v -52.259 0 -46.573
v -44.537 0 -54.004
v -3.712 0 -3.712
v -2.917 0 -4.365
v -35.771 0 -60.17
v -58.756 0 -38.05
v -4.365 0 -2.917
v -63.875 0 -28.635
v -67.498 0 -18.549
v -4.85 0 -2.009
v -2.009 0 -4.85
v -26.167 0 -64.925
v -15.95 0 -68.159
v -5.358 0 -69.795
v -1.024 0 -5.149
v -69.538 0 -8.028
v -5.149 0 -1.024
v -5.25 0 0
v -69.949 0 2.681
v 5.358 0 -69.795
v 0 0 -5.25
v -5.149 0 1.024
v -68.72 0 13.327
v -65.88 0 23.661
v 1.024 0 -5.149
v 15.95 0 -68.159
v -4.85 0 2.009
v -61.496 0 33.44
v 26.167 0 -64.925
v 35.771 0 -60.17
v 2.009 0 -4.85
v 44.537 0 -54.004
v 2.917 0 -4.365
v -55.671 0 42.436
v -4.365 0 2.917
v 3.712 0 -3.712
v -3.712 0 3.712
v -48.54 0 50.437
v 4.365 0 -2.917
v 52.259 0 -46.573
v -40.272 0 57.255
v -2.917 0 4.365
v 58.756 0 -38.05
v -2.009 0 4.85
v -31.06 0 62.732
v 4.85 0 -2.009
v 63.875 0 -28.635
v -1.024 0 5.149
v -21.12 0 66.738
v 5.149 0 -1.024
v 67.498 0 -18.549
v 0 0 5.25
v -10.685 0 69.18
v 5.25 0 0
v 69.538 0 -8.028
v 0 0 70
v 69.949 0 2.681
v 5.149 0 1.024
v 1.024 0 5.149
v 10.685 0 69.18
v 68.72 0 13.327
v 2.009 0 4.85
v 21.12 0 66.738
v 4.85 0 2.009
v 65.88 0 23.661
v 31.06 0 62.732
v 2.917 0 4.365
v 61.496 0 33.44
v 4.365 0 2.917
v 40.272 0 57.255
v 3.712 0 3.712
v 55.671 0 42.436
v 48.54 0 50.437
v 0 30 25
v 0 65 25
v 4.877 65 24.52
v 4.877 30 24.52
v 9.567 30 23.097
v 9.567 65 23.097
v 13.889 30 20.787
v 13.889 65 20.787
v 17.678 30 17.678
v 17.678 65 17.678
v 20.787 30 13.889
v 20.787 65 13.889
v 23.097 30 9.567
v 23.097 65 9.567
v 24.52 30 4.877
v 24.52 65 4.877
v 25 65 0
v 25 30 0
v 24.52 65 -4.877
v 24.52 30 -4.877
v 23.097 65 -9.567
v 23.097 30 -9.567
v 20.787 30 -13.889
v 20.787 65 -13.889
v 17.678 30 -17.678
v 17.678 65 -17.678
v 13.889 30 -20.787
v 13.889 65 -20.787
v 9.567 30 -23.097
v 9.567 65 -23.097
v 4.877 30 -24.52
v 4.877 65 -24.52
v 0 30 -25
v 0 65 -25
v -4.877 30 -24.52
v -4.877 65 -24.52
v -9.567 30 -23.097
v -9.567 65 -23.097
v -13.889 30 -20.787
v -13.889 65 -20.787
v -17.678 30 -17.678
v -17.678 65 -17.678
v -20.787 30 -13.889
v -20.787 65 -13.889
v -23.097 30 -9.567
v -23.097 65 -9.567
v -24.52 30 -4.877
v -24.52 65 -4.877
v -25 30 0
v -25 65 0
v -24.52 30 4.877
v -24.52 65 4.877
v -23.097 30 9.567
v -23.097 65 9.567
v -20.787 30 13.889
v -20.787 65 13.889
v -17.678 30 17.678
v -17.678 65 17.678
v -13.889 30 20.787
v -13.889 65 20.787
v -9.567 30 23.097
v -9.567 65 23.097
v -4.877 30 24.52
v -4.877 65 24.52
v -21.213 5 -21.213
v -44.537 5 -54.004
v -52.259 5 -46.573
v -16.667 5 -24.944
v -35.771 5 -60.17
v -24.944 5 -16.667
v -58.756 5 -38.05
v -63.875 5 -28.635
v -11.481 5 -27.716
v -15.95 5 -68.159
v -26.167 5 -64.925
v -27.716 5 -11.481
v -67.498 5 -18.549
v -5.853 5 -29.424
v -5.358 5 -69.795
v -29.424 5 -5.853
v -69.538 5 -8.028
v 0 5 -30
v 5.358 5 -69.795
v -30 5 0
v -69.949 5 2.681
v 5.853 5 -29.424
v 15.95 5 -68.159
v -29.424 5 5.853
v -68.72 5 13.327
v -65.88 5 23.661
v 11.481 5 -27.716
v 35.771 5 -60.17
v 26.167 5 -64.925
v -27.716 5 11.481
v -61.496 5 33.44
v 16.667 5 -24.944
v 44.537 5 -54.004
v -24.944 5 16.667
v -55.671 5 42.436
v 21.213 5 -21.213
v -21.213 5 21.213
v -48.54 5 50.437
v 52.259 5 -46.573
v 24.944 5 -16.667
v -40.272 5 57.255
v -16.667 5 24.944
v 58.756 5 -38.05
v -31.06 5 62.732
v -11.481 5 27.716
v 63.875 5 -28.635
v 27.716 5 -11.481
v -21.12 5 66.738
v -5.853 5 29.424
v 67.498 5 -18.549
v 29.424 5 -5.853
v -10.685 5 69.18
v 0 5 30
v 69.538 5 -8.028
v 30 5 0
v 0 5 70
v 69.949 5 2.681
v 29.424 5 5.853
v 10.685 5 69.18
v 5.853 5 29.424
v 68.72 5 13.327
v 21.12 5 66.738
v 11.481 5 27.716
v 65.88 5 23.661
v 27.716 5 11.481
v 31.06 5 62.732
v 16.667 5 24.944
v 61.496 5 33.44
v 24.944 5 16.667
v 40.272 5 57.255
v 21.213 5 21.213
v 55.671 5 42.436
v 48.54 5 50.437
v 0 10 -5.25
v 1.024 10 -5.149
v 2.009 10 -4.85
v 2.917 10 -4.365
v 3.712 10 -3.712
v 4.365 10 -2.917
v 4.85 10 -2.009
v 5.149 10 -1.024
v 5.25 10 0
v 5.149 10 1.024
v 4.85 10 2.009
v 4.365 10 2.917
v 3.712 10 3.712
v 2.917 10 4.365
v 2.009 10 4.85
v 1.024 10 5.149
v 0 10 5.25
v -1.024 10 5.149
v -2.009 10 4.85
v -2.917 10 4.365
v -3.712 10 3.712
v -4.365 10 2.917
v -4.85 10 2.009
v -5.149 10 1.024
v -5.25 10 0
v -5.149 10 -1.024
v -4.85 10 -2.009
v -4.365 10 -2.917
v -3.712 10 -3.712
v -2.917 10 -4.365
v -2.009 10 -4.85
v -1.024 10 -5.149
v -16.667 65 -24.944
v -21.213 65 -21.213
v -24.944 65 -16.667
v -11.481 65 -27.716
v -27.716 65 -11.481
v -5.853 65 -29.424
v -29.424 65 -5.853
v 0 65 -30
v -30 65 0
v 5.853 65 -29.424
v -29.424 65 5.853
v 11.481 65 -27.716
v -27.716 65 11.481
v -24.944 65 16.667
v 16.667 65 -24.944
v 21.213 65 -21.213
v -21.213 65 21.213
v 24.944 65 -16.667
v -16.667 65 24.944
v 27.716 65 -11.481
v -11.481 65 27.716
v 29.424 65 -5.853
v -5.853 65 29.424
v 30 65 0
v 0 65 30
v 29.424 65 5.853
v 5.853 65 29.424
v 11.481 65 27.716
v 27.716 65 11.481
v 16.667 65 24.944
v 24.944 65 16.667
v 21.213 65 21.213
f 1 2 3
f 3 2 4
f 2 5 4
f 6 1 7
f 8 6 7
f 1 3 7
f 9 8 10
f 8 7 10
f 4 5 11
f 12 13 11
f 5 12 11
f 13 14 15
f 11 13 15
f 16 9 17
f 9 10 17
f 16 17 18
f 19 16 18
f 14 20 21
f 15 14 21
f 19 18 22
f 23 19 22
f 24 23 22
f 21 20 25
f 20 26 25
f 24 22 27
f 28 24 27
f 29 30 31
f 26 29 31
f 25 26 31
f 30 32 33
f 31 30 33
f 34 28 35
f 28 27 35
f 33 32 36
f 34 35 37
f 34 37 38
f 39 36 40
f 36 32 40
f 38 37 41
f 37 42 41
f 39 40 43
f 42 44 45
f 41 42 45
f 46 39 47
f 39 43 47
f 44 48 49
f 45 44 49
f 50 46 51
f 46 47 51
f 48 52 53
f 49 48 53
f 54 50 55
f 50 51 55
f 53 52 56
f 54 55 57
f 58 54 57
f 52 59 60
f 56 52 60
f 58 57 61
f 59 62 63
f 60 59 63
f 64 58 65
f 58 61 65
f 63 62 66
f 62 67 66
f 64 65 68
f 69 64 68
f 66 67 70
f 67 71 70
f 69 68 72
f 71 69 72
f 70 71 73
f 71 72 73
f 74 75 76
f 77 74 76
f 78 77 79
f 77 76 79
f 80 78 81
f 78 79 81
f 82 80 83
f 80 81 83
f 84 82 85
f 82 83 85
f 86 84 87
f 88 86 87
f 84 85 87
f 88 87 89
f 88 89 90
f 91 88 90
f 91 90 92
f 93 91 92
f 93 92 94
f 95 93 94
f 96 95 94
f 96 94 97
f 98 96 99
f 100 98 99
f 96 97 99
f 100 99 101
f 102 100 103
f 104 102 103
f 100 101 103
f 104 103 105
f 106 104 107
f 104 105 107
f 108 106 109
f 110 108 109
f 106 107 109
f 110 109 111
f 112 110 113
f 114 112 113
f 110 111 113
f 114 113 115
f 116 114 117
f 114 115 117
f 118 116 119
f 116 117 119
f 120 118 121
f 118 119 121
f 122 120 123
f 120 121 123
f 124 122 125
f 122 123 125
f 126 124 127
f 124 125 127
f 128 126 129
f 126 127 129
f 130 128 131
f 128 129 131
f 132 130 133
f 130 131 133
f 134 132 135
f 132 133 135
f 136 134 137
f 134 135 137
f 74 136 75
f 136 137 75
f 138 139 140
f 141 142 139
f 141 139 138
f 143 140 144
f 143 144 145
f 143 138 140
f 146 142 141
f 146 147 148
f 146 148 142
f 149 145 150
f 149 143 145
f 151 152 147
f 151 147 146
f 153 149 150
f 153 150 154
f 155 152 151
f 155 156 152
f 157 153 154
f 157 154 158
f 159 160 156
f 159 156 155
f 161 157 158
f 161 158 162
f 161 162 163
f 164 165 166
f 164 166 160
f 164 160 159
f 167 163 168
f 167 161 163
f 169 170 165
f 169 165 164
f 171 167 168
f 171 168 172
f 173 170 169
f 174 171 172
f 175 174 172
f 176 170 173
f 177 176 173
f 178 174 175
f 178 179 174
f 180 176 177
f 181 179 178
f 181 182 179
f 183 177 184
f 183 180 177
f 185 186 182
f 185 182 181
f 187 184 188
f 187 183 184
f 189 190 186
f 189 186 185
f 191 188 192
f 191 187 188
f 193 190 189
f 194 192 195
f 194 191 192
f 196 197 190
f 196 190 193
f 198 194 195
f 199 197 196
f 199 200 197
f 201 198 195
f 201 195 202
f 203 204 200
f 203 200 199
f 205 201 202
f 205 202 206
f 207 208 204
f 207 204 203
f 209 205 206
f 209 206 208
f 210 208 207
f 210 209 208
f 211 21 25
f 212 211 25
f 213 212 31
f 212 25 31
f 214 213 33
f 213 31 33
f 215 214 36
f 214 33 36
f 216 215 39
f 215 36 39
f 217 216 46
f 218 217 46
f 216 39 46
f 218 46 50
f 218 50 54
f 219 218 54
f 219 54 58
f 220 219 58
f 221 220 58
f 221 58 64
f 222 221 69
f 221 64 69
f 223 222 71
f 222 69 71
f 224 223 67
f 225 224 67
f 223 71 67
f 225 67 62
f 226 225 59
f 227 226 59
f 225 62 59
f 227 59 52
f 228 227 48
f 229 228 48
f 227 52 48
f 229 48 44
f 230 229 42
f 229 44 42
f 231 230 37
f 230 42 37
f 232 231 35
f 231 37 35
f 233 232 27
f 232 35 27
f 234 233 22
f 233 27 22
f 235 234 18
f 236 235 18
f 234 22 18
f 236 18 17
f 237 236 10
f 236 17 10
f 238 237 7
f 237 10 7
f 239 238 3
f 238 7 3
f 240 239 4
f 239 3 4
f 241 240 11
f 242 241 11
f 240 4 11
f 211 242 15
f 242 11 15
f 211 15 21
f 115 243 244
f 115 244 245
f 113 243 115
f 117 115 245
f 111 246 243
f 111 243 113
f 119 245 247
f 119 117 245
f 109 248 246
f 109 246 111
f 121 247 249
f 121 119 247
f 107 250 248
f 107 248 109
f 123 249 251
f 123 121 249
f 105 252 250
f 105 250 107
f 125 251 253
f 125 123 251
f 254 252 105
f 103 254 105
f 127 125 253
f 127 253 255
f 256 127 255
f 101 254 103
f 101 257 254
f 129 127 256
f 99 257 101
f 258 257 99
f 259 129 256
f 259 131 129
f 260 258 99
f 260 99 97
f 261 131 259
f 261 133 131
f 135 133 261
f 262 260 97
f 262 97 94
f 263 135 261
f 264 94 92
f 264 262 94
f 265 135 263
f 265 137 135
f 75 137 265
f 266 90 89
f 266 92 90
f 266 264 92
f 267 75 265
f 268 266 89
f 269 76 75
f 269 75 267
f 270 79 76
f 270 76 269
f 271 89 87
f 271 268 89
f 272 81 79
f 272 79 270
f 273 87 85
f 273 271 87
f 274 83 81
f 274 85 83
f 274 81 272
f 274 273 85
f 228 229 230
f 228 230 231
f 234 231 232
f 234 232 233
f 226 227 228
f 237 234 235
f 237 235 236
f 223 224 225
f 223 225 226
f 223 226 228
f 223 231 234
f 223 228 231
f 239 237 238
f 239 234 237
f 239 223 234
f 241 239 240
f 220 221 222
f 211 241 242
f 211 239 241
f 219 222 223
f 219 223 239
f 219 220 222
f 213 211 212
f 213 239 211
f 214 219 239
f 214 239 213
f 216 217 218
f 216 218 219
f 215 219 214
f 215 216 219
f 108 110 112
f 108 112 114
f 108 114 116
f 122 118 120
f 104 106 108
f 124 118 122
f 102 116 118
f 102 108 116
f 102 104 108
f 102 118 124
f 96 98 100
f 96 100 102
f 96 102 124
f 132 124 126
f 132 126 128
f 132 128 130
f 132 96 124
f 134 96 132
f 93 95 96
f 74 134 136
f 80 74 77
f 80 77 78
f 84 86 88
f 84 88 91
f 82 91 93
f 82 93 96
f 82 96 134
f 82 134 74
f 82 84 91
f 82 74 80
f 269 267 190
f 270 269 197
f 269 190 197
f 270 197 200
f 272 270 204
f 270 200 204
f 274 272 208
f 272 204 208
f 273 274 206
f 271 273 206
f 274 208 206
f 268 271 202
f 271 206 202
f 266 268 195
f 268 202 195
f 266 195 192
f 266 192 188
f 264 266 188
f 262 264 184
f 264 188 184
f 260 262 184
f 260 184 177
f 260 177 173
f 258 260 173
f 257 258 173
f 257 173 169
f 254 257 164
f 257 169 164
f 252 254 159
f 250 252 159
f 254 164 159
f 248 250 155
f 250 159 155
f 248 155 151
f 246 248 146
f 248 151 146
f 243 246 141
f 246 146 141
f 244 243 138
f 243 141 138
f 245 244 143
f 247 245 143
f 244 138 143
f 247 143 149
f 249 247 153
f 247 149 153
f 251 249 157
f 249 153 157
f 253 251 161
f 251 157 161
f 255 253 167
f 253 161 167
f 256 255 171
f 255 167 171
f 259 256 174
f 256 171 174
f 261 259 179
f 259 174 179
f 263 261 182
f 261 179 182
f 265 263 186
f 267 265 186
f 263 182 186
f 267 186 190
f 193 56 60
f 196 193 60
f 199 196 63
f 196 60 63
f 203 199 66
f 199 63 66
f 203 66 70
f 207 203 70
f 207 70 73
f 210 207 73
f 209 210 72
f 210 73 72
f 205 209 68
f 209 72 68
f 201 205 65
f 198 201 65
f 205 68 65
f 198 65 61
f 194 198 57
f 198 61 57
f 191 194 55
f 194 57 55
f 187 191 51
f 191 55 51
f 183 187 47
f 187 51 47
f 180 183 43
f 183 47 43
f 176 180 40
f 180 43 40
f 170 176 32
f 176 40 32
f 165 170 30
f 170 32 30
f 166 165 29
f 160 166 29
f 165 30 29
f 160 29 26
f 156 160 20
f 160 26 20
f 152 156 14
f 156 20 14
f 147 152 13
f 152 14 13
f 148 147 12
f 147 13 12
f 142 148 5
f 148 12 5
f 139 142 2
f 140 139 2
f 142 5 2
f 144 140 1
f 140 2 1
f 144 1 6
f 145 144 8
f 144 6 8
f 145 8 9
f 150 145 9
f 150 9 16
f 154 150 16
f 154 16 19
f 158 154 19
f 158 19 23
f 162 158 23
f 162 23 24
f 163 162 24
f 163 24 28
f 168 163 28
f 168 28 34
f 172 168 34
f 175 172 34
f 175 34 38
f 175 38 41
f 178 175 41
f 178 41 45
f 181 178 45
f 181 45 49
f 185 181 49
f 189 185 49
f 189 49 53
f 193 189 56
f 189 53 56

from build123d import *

# Parameters (mm, degrees)
CROQUIS1_R              = 70
SALIENTE_EXTRUIR1_DEPTH = 5
CROQUIS2_R              = 30
SALIENTE_EXTRUIR2_DEPTH = 60
CROQUIS5_R              = 5.25
CORTAR_EXTRUIR5_DEPTH   = 10
CROQUIS7_R              = 25
CORTAR_EXTRUIR6_DEPTH   = 35


with BuildPart() as part:
    # Croquis1 → Saliente-Extruir1 (new body)
    with BuildSketch(Plane(origin=(0, 0, 0), x_dir=(1, 0, 0), z_dir=(0, 1, 0))):
        with Locations(Location((0, 0, 0), (0, 0, 270))):
            Circle(CROQUIS1_R)
    extrude(amount=SALIENTE_EXTRUIR1_DEPTH)

    # Croquis2 → Saliente-Extruir2 (add)
    with BuildSketch(Plane(origin=(0, 5, 0), x_dir=(1, 0, 0), z_dir=(0, 1, 0))):
        with Locations(Location((0, 0, 0), (0, 0, 270))):
            Circle(CROQUIS2_R)
    extrude(amount=SALIENTE_EXTRUIR2_DEPTH)

    # Croquis5 → Cortar-Extruir5 (cut)
    with BuildSketch(Plane.XZ):
        with Locations(Location((0, 0, 0), (0, 0, 270))):
            Circle(CROQUIS5_R)
    extrude(amount=-CORTAR_EXTRUIR5_DEPTH, mode=Mode.SUBTRACT)

    # Croquis7 → Cortar-Extruir6 (cut)
    with BuildSketch(Plane(origin=(0, 65, 0), x_dir=(1, 0, 0), z_dir=(0, 1, 0))):
        with Locations(Location((0, 0, 0), (0, 0, 270))):
            Circle(CROQUIS7_R)
    extrude(amount=-CORTAR_EXTRUIR6_DEPTH, mode=Mode.SUBTRACT)


solid = part.part
